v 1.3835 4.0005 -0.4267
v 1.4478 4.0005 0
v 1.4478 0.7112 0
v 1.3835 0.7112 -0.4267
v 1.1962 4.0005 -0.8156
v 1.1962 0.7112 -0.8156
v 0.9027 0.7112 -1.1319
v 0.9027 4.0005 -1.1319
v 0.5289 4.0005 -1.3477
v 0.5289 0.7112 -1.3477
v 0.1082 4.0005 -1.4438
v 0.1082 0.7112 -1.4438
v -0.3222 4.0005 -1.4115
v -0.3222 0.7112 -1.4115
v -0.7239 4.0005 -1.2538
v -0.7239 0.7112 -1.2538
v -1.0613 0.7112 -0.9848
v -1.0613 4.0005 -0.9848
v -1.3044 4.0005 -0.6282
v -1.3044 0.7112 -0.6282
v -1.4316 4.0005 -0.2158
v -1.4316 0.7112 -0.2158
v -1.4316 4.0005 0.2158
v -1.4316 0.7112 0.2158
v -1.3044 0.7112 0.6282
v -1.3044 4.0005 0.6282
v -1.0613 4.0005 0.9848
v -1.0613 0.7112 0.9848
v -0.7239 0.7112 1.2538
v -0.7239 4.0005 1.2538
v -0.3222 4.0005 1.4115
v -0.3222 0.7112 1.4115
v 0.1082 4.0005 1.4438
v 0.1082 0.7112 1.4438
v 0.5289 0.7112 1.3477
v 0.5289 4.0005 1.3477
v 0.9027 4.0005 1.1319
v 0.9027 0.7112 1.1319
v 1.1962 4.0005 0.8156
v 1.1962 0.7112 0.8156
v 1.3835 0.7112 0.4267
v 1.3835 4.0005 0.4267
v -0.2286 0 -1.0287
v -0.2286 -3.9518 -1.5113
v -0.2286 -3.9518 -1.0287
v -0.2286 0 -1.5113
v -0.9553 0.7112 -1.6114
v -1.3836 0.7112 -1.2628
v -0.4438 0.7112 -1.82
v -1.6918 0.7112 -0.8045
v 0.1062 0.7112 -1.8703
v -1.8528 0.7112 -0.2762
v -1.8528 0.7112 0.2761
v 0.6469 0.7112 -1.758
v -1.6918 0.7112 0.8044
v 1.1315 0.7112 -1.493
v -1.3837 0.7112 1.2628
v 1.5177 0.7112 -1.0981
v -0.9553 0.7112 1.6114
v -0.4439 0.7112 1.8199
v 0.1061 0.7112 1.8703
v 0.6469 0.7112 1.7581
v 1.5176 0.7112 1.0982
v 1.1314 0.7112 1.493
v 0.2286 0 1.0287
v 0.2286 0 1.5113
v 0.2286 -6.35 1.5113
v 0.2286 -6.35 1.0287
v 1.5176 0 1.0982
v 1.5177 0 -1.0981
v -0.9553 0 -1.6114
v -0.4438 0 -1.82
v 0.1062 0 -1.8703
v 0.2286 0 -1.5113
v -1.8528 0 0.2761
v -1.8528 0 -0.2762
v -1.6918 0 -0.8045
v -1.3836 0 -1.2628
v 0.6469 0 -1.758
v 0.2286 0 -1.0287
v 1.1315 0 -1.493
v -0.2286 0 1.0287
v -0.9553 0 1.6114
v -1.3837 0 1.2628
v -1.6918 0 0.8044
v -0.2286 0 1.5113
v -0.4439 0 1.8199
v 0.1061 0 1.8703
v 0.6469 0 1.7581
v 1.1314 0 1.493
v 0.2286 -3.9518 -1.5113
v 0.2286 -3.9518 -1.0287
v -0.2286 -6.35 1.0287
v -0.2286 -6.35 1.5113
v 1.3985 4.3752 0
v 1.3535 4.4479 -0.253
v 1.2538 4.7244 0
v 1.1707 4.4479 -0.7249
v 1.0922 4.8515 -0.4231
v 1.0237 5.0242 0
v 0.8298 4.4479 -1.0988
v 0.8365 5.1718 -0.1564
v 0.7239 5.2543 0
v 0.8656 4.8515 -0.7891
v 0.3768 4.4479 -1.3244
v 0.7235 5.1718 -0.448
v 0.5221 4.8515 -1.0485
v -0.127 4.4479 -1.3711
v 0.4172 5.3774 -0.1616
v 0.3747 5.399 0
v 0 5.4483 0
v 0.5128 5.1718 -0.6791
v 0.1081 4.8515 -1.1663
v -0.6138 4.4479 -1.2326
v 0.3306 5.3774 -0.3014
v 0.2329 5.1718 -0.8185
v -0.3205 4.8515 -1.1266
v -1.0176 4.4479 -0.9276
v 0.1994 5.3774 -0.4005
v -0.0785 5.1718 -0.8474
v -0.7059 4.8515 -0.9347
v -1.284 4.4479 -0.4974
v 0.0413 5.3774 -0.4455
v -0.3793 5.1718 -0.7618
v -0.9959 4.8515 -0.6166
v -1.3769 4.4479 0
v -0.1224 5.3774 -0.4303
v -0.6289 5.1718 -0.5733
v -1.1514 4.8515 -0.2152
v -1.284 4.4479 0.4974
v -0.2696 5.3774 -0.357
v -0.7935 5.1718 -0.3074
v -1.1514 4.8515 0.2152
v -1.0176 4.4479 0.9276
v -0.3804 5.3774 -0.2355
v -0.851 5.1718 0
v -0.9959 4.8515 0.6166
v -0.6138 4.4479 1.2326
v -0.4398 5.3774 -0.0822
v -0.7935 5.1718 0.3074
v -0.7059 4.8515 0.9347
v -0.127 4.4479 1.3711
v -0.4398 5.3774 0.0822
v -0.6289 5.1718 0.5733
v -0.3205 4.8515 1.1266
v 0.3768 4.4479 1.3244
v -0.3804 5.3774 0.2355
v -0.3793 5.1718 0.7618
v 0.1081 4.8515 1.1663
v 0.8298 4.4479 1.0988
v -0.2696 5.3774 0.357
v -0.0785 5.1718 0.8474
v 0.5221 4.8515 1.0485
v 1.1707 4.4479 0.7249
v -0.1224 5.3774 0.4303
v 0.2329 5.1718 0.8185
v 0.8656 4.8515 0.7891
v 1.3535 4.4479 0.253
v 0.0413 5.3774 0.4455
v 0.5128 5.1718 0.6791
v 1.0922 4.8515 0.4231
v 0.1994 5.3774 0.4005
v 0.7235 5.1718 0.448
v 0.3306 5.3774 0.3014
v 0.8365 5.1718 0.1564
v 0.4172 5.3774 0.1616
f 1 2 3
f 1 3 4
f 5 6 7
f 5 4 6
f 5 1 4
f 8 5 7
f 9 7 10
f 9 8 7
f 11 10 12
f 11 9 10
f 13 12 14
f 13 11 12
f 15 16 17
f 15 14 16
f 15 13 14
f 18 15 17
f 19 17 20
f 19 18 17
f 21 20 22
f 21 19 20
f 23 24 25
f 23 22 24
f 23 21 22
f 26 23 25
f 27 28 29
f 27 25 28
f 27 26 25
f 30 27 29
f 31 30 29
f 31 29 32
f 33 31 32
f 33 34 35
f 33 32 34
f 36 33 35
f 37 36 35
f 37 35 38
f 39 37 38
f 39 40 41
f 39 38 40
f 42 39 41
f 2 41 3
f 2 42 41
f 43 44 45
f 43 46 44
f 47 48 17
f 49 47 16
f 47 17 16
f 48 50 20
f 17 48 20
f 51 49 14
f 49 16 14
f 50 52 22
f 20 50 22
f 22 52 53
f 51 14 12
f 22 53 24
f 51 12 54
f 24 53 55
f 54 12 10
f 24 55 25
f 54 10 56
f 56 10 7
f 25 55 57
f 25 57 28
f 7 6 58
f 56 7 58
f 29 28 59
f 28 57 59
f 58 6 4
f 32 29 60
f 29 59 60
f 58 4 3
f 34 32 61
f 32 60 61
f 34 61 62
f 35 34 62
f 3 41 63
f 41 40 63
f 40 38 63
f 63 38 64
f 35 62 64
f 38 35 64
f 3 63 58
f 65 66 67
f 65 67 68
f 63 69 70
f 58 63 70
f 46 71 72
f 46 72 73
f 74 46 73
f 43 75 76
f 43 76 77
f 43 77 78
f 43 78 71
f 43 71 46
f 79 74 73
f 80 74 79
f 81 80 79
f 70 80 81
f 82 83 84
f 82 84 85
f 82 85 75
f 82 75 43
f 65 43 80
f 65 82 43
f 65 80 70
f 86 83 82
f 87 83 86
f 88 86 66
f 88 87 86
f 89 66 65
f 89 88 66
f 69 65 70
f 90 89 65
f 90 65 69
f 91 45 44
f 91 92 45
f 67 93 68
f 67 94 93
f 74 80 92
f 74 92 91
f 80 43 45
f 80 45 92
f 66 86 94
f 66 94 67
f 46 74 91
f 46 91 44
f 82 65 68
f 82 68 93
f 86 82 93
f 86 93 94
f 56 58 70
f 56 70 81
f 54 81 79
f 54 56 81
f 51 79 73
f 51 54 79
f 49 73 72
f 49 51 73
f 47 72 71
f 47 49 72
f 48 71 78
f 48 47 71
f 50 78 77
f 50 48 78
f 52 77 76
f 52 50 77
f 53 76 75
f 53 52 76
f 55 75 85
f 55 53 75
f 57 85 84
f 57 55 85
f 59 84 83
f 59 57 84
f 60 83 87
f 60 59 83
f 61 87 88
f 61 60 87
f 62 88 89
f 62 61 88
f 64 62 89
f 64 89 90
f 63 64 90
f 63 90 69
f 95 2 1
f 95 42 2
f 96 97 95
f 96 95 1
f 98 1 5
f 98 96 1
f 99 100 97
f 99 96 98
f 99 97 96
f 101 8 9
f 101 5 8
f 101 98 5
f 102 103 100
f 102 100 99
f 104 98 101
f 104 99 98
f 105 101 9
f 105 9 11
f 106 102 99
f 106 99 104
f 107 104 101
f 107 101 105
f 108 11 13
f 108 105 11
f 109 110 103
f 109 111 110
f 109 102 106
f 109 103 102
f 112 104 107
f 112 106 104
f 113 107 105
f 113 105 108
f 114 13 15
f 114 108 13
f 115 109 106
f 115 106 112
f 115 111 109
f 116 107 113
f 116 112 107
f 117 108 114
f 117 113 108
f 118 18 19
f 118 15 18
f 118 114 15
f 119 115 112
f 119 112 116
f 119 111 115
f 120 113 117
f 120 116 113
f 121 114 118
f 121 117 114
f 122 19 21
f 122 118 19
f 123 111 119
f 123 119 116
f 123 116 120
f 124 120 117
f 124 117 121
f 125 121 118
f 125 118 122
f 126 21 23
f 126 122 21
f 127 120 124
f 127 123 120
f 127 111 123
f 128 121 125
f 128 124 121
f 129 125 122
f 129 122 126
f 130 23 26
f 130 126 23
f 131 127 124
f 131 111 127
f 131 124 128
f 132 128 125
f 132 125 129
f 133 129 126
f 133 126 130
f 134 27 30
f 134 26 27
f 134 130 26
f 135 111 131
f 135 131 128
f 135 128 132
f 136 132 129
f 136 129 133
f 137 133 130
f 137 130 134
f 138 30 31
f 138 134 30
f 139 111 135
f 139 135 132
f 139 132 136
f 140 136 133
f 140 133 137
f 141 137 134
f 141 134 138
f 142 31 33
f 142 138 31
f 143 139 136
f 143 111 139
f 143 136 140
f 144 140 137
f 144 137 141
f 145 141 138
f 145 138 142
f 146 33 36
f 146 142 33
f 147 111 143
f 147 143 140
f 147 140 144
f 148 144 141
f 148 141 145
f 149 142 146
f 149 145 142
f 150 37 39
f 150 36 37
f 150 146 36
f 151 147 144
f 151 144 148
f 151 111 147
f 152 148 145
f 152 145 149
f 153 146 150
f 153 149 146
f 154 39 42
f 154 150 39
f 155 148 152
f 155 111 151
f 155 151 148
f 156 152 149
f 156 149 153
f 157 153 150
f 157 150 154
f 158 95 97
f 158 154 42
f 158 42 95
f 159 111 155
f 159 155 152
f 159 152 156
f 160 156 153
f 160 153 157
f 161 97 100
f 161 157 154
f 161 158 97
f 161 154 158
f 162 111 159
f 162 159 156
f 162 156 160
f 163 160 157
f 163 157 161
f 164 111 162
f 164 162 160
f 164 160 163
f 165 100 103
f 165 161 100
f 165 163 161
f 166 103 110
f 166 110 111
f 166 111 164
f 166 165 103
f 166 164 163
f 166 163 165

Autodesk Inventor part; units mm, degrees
ref_plane "YZ Plane" through (0, 0, 0) normal (1, 0, 0) x (0, 1, 0)
ref_plane "XZ Plane" through (0, 0, 0) normal (0, 1, 0) x (-1, 0, 0)
ref_plane "XY Plane" through (0, 0, 0) normal (0, 0, 1) x (1, 0, 0)
sketch "Sketch1" plane through (0, 0, 0) normal (0, 0, 1) x (1, 0, 0)
  line L0 (0, 0) -> (1.8733, 0)
  line L1 (1.8733, 0) -> (1.8733, 0.7112)
  line L2 (1.8733, 0.7112) -> (1.4478, 0.7112)
  line L3 (1.4478, 0.7112) -> (1.4478, 4.0005)
  arc A0 (1.4478, 4.0005) -> (0, 5.4483) centre (0, 4.0005) ccw
  line L4 (0, 5.4483) -> (0, 0)
  dimension "d0" = 1.4478
  dimension "d1" = 0.7112
  dimension "d2" = 1.8733
  dimension "d3" = 5.4483
revolve "Revolution1" add sketch "Sketch1" angle 360 about axis through (0, 5.4483, 0) along (0, -1, 0)
sketch "Sketch2" plane through (0, 0, 0) normal (0, -1, 0) x (1, 0, 0)
  line L0 (4.2518, 2.7248) -> (1.5176, 2.7248)
  line L1 (1.5176, 2.7248) -> (1.5177, -2.7614)
  line L2 (1.5177, -2.7614) -> (4.2518, -2.7614)
  line L3 (4.2518, -2.7614) -> (4.2518, 2.7248)
  circle A0 centre (0, 0) radius 1.8732 projected
  dimension "d5" = 3.3909
extrude "Extrusion1" cut sketch "Sketch2" against normal blind 25.4 contours L3 L2 L1 A0 L0 | A0 L1 picked at (1.5825, -0.2532)
sketch "Sketch3" plane through (0, 0, 0) normal (0, -1, 0) x (1, 0, 0)
  line L0 (-0.2286, -1.0287) -> (0.2286, -1.0287)
  line L1 (0.2286, -1.0287) -> (0.2286, -1.5113)
  line L2 (0.2286, -1.5113) -> (-0.2286, -1.5113)
  line L3 (-0.2286, -1.5113) -> (-0.2286, -1.0287)
  line L4 (-0.2286, 1.5113) -> (0.2286, 1.5113)
  line L5 (0.2286, 1.5113) -> (0.2286, 1.0287)
  line L6 (0.2286, 1.0287) -> (-0.2286, 1.0287)
  line L7 (-0.2286, 1.0287) -> (-0.2286, 1.5113)
  line L8 (0, 0) -> (0, 1.0287)
  line L9 (0, 0) -> (0, -1.0287)
  dimension "d13" = 0.4572
  dimension "d14" = 0.4826
  dimension "d15" = 3.0226
extrude "Extrusion2" add sketch "Sketch3" along normal blind 6.35
sketch "Sketch5" plane through (0.2286, -6.35, -1.0287) normal (1, 0, 0) x (0, 0, -1)
  line L0 (1.6967, -0.6432) -> (-0.5604, -0.6432)
  line L1 (-0.5604, -0.6432) -> (-0.5604, 2.3982)
  line L2 (-0.5604, 2.3982) -> (1.6967, 2.3982)
  line L3 (1.6967, 2.3982) -> (1.6967, -0.6432)
  point P0 (-1.0287, 6.35)
extrude "Extrusion3" cut sketch "Sketch5" against normal blind 25.4
properties part number "LED"
